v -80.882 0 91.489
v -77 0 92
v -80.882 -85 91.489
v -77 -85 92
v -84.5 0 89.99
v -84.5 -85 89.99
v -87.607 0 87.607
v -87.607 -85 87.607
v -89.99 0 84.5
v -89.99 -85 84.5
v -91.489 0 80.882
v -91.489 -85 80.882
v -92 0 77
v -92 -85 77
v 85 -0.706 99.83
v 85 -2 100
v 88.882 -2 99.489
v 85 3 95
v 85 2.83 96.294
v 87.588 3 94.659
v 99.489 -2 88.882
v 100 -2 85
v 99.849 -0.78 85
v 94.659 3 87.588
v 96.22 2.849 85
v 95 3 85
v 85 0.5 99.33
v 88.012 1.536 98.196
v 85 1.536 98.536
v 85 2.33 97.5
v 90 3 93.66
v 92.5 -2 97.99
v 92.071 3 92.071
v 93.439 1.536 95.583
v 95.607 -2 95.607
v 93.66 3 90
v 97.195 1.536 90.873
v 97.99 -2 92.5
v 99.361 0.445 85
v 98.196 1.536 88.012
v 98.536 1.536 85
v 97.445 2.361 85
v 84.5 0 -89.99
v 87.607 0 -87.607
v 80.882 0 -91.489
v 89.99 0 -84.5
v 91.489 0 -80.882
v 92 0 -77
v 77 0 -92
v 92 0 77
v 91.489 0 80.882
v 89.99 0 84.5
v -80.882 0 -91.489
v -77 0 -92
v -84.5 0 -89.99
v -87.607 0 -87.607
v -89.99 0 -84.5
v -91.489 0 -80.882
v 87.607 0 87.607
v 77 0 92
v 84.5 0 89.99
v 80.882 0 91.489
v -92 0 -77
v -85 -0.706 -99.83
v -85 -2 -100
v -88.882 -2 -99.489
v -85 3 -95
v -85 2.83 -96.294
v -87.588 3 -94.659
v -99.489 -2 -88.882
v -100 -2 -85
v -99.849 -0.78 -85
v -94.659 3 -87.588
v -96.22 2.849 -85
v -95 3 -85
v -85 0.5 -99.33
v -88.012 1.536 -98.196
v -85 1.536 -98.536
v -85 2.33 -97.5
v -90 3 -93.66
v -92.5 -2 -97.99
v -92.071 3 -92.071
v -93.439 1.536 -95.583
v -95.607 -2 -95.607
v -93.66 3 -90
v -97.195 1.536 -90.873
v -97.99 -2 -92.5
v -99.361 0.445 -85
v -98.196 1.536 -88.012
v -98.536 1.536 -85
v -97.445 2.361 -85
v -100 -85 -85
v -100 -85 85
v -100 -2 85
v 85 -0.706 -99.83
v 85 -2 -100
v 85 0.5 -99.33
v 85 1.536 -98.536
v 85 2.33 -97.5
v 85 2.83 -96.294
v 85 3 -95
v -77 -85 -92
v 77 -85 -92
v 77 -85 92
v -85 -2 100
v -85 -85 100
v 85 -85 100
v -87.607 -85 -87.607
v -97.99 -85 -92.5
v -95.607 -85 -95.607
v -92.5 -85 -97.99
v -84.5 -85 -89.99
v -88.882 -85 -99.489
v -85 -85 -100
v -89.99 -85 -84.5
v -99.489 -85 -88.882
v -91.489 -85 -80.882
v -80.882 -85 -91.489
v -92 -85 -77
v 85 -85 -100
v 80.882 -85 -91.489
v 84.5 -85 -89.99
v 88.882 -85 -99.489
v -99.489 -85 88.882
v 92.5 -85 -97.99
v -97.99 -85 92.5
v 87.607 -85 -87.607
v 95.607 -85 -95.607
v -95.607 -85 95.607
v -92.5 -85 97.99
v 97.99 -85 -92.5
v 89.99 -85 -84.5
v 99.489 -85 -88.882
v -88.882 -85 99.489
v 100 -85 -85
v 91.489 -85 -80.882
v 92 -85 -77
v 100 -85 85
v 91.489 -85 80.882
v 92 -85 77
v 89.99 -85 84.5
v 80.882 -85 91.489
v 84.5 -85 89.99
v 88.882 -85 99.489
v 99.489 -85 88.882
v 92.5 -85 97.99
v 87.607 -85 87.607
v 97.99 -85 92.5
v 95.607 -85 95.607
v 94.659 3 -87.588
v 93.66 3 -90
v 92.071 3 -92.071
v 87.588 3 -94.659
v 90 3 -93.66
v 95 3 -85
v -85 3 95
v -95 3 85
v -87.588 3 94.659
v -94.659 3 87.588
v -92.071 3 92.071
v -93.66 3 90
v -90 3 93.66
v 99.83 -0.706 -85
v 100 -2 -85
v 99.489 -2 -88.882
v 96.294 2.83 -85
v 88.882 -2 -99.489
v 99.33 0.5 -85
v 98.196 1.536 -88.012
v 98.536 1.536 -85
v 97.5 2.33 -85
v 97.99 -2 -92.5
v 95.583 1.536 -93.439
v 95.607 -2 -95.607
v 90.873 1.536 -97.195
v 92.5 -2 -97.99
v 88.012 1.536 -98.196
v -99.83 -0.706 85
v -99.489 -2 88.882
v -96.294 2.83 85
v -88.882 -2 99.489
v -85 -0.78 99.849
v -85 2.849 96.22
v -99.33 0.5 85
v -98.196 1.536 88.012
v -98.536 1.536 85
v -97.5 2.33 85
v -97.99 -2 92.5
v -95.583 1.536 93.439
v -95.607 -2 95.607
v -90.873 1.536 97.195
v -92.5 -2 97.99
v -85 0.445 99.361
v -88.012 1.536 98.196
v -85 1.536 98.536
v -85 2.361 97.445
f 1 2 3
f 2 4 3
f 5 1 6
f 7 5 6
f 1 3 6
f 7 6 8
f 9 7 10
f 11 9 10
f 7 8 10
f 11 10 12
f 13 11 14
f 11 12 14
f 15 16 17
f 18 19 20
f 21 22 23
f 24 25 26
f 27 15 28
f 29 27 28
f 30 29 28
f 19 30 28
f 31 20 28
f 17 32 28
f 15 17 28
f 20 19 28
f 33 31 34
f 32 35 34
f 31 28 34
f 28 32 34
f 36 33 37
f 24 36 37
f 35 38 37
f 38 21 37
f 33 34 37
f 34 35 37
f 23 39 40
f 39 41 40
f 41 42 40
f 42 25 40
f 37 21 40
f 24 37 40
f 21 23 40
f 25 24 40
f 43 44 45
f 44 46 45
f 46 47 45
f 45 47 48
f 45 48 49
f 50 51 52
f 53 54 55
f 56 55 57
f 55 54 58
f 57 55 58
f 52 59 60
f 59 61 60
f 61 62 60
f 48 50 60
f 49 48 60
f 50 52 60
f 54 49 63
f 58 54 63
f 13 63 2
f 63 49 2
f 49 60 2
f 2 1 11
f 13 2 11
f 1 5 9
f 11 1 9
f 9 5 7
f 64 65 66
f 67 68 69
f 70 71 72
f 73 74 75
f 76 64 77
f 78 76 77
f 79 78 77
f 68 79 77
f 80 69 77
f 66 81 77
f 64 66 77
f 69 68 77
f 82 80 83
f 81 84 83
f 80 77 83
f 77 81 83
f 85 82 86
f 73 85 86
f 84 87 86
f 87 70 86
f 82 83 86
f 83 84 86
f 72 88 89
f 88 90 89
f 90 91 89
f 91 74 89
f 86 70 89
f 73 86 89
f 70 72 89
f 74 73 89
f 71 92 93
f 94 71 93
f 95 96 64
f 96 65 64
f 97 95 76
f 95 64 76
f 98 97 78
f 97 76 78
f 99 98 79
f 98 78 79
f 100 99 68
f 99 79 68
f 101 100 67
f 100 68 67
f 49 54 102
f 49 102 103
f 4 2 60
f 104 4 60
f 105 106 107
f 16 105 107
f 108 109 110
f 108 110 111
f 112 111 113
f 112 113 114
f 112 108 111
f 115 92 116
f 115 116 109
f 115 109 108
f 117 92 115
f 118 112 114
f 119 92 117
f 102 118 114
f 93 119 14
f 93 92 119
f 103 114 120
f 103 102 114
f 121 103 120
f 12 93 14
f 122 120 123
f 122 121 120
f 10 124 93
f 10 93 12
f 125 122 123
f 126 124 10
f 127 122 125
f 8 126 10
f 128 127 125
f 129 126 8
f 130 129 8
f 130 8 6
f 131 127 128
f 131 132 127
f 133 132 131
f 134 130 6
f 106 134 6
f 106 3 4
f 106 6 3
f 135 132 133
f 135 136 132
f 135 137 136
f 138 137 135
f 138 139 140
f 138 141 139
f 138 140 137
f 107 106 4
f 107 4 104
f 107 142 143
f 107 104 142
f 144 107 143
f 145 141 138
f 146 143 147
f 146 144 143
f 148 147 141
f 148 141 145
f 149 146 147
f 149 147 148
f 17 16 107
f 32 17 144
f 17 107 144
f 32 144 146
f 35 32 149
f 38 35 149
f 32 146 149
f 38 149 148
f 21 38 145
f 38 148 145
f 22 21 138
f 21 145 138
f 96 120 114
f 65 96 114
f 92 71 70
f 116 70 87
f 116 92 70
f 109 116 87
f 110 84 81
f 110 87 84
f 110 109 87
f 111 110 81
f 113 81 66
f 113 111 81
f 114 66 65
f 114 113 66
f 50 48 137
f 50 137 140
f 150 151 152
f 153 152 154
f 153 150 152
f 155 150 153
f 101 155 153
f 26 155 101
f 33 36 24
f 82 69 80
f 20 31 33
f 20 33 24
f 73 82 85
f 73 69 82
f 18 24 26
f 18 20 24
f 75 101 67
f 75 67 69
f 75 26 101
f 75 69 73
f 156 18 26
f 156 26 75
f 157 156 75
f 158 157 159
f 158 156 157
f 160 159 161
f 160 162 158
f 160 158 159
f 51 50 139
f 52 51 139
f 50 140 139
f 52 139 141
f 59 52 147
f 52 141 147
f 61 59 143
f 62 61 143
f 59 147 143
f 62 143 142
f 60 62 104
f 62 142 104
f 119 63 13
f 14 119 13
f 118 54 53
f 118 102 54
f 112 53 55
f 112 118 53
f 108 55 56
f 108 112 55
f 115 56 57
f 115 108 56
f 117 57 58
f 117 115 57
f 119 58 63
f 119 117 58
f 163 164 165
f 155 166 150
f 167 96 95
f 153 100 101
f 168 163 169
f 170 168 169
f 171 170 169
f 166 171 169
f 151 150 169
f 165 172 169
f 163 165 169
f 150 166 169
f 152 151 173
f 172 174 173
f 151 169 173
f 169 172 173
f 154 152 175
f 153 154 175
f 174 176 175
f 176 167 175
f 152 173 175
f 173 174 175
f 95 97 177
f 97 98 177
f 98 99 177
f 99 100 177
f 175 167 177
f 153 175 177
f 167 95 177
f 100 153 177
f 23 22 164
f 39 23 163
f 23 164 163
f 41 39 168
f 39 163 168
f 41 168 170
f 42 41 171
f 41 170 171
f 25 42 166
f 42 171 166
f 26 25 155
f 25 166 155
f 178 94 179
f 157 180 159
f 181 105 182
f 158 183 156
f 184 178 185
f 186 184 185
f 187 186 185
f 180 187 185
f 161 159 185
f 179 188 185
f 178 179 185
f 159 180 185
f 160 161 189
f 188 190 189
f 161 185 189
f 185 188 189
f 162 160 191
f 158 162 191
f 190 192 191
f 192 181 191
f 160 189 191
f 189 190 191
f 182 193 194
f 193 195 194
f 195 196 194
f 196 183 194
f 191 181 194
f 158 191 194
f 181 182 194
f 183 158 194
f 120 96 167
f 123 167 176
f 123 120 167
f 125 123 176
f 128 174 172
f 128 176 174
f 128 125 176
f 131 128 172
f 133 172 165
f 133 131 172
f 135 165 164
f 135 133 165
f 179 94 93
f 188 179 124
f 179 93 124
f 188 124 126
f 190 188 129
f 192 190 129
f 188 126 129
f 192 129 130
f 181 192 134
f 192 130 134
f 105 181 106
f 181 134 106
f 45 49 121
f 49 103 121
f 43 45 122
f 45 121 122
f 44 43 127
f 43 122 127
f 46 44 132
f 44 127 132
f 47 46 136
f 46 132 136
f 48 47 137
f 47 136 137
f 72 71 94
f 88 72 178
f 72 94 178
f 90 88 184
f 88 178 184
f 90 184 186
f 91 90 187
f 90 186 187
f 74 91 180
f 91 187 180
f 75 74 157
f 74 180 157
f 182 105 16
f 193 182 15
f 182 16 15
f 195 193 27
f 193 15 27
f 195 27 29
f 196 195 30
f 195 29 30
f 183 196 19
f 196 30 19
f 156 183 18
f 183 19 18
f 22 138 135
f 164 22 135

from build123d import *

# Parameters (mm, degrees)
F0_W     = 200
F0_H     = 200
F0_W_2   = 184
F0_H_2   = 184
F1_DEPTH = 85
F2_R     = 15
F4_DEPTH = 3
F5_R     = 5


with BuildPart() as f1:
    # F0 (on Front) → F1 (new body)
    with BuildSketch(Plane.XZ):
        Rectangle(F0_W, F0_H)
        Rectangle(F0_W_2, F0_H_2, mode=Mode.SUBTRACT)
    extrude(amount=F1_DEPTH)

    # F2
    f2_edges = [f1.edges().sort_by_distance(p)[0] for p in [
        (-100, -42.5, 100),
        (-92, -42.5, 92),
        (100, -42.5, 100),
        (92, -42.5, 92),
        (100, -42.5, -100),
        (92, -42.5, -92),
        (-92, -42.5, -92),
        (-100, -42.5, -100),
    ]]
    fillet(f2_edges, radius=F2_R)

    # F3 (on face) → F4 (join)
    with BuildSketch(Plane(origin=(0, 0, 0), x_dir=(-1, 0, 0), z_dir=(0, 1, 0))):
        with BuildLine():
            Line((-85, -100), (85, -100))
            ThreePointArc((85, -100), (95.606602, -95.606602), (100, -85))
            Line((100, -85), (100, 85))
            ThreePointArc((100, 85), (95.606602, 95.606602), (85, 100))
            Line((85, 100), (-85, 100))
            ThreePointArc((-85, 100), (-95.606602, 95.606602), (-100, 85))
            Line((-100, 85), (-100, -85))
            ThreePointArc((-100, -85), (-95.606602, -95.606602), (-85, -100))
        make_face()
    extrude(amount=F4_DEPTH)

    # F5
    f5_edges = [f1.edges().sort_by_distance(p)[0] for p in [
        (95.606602, 3, -95.606602),
    ]]
    fillet(f5_edges, radius=F5_R)


solid = f1.part
